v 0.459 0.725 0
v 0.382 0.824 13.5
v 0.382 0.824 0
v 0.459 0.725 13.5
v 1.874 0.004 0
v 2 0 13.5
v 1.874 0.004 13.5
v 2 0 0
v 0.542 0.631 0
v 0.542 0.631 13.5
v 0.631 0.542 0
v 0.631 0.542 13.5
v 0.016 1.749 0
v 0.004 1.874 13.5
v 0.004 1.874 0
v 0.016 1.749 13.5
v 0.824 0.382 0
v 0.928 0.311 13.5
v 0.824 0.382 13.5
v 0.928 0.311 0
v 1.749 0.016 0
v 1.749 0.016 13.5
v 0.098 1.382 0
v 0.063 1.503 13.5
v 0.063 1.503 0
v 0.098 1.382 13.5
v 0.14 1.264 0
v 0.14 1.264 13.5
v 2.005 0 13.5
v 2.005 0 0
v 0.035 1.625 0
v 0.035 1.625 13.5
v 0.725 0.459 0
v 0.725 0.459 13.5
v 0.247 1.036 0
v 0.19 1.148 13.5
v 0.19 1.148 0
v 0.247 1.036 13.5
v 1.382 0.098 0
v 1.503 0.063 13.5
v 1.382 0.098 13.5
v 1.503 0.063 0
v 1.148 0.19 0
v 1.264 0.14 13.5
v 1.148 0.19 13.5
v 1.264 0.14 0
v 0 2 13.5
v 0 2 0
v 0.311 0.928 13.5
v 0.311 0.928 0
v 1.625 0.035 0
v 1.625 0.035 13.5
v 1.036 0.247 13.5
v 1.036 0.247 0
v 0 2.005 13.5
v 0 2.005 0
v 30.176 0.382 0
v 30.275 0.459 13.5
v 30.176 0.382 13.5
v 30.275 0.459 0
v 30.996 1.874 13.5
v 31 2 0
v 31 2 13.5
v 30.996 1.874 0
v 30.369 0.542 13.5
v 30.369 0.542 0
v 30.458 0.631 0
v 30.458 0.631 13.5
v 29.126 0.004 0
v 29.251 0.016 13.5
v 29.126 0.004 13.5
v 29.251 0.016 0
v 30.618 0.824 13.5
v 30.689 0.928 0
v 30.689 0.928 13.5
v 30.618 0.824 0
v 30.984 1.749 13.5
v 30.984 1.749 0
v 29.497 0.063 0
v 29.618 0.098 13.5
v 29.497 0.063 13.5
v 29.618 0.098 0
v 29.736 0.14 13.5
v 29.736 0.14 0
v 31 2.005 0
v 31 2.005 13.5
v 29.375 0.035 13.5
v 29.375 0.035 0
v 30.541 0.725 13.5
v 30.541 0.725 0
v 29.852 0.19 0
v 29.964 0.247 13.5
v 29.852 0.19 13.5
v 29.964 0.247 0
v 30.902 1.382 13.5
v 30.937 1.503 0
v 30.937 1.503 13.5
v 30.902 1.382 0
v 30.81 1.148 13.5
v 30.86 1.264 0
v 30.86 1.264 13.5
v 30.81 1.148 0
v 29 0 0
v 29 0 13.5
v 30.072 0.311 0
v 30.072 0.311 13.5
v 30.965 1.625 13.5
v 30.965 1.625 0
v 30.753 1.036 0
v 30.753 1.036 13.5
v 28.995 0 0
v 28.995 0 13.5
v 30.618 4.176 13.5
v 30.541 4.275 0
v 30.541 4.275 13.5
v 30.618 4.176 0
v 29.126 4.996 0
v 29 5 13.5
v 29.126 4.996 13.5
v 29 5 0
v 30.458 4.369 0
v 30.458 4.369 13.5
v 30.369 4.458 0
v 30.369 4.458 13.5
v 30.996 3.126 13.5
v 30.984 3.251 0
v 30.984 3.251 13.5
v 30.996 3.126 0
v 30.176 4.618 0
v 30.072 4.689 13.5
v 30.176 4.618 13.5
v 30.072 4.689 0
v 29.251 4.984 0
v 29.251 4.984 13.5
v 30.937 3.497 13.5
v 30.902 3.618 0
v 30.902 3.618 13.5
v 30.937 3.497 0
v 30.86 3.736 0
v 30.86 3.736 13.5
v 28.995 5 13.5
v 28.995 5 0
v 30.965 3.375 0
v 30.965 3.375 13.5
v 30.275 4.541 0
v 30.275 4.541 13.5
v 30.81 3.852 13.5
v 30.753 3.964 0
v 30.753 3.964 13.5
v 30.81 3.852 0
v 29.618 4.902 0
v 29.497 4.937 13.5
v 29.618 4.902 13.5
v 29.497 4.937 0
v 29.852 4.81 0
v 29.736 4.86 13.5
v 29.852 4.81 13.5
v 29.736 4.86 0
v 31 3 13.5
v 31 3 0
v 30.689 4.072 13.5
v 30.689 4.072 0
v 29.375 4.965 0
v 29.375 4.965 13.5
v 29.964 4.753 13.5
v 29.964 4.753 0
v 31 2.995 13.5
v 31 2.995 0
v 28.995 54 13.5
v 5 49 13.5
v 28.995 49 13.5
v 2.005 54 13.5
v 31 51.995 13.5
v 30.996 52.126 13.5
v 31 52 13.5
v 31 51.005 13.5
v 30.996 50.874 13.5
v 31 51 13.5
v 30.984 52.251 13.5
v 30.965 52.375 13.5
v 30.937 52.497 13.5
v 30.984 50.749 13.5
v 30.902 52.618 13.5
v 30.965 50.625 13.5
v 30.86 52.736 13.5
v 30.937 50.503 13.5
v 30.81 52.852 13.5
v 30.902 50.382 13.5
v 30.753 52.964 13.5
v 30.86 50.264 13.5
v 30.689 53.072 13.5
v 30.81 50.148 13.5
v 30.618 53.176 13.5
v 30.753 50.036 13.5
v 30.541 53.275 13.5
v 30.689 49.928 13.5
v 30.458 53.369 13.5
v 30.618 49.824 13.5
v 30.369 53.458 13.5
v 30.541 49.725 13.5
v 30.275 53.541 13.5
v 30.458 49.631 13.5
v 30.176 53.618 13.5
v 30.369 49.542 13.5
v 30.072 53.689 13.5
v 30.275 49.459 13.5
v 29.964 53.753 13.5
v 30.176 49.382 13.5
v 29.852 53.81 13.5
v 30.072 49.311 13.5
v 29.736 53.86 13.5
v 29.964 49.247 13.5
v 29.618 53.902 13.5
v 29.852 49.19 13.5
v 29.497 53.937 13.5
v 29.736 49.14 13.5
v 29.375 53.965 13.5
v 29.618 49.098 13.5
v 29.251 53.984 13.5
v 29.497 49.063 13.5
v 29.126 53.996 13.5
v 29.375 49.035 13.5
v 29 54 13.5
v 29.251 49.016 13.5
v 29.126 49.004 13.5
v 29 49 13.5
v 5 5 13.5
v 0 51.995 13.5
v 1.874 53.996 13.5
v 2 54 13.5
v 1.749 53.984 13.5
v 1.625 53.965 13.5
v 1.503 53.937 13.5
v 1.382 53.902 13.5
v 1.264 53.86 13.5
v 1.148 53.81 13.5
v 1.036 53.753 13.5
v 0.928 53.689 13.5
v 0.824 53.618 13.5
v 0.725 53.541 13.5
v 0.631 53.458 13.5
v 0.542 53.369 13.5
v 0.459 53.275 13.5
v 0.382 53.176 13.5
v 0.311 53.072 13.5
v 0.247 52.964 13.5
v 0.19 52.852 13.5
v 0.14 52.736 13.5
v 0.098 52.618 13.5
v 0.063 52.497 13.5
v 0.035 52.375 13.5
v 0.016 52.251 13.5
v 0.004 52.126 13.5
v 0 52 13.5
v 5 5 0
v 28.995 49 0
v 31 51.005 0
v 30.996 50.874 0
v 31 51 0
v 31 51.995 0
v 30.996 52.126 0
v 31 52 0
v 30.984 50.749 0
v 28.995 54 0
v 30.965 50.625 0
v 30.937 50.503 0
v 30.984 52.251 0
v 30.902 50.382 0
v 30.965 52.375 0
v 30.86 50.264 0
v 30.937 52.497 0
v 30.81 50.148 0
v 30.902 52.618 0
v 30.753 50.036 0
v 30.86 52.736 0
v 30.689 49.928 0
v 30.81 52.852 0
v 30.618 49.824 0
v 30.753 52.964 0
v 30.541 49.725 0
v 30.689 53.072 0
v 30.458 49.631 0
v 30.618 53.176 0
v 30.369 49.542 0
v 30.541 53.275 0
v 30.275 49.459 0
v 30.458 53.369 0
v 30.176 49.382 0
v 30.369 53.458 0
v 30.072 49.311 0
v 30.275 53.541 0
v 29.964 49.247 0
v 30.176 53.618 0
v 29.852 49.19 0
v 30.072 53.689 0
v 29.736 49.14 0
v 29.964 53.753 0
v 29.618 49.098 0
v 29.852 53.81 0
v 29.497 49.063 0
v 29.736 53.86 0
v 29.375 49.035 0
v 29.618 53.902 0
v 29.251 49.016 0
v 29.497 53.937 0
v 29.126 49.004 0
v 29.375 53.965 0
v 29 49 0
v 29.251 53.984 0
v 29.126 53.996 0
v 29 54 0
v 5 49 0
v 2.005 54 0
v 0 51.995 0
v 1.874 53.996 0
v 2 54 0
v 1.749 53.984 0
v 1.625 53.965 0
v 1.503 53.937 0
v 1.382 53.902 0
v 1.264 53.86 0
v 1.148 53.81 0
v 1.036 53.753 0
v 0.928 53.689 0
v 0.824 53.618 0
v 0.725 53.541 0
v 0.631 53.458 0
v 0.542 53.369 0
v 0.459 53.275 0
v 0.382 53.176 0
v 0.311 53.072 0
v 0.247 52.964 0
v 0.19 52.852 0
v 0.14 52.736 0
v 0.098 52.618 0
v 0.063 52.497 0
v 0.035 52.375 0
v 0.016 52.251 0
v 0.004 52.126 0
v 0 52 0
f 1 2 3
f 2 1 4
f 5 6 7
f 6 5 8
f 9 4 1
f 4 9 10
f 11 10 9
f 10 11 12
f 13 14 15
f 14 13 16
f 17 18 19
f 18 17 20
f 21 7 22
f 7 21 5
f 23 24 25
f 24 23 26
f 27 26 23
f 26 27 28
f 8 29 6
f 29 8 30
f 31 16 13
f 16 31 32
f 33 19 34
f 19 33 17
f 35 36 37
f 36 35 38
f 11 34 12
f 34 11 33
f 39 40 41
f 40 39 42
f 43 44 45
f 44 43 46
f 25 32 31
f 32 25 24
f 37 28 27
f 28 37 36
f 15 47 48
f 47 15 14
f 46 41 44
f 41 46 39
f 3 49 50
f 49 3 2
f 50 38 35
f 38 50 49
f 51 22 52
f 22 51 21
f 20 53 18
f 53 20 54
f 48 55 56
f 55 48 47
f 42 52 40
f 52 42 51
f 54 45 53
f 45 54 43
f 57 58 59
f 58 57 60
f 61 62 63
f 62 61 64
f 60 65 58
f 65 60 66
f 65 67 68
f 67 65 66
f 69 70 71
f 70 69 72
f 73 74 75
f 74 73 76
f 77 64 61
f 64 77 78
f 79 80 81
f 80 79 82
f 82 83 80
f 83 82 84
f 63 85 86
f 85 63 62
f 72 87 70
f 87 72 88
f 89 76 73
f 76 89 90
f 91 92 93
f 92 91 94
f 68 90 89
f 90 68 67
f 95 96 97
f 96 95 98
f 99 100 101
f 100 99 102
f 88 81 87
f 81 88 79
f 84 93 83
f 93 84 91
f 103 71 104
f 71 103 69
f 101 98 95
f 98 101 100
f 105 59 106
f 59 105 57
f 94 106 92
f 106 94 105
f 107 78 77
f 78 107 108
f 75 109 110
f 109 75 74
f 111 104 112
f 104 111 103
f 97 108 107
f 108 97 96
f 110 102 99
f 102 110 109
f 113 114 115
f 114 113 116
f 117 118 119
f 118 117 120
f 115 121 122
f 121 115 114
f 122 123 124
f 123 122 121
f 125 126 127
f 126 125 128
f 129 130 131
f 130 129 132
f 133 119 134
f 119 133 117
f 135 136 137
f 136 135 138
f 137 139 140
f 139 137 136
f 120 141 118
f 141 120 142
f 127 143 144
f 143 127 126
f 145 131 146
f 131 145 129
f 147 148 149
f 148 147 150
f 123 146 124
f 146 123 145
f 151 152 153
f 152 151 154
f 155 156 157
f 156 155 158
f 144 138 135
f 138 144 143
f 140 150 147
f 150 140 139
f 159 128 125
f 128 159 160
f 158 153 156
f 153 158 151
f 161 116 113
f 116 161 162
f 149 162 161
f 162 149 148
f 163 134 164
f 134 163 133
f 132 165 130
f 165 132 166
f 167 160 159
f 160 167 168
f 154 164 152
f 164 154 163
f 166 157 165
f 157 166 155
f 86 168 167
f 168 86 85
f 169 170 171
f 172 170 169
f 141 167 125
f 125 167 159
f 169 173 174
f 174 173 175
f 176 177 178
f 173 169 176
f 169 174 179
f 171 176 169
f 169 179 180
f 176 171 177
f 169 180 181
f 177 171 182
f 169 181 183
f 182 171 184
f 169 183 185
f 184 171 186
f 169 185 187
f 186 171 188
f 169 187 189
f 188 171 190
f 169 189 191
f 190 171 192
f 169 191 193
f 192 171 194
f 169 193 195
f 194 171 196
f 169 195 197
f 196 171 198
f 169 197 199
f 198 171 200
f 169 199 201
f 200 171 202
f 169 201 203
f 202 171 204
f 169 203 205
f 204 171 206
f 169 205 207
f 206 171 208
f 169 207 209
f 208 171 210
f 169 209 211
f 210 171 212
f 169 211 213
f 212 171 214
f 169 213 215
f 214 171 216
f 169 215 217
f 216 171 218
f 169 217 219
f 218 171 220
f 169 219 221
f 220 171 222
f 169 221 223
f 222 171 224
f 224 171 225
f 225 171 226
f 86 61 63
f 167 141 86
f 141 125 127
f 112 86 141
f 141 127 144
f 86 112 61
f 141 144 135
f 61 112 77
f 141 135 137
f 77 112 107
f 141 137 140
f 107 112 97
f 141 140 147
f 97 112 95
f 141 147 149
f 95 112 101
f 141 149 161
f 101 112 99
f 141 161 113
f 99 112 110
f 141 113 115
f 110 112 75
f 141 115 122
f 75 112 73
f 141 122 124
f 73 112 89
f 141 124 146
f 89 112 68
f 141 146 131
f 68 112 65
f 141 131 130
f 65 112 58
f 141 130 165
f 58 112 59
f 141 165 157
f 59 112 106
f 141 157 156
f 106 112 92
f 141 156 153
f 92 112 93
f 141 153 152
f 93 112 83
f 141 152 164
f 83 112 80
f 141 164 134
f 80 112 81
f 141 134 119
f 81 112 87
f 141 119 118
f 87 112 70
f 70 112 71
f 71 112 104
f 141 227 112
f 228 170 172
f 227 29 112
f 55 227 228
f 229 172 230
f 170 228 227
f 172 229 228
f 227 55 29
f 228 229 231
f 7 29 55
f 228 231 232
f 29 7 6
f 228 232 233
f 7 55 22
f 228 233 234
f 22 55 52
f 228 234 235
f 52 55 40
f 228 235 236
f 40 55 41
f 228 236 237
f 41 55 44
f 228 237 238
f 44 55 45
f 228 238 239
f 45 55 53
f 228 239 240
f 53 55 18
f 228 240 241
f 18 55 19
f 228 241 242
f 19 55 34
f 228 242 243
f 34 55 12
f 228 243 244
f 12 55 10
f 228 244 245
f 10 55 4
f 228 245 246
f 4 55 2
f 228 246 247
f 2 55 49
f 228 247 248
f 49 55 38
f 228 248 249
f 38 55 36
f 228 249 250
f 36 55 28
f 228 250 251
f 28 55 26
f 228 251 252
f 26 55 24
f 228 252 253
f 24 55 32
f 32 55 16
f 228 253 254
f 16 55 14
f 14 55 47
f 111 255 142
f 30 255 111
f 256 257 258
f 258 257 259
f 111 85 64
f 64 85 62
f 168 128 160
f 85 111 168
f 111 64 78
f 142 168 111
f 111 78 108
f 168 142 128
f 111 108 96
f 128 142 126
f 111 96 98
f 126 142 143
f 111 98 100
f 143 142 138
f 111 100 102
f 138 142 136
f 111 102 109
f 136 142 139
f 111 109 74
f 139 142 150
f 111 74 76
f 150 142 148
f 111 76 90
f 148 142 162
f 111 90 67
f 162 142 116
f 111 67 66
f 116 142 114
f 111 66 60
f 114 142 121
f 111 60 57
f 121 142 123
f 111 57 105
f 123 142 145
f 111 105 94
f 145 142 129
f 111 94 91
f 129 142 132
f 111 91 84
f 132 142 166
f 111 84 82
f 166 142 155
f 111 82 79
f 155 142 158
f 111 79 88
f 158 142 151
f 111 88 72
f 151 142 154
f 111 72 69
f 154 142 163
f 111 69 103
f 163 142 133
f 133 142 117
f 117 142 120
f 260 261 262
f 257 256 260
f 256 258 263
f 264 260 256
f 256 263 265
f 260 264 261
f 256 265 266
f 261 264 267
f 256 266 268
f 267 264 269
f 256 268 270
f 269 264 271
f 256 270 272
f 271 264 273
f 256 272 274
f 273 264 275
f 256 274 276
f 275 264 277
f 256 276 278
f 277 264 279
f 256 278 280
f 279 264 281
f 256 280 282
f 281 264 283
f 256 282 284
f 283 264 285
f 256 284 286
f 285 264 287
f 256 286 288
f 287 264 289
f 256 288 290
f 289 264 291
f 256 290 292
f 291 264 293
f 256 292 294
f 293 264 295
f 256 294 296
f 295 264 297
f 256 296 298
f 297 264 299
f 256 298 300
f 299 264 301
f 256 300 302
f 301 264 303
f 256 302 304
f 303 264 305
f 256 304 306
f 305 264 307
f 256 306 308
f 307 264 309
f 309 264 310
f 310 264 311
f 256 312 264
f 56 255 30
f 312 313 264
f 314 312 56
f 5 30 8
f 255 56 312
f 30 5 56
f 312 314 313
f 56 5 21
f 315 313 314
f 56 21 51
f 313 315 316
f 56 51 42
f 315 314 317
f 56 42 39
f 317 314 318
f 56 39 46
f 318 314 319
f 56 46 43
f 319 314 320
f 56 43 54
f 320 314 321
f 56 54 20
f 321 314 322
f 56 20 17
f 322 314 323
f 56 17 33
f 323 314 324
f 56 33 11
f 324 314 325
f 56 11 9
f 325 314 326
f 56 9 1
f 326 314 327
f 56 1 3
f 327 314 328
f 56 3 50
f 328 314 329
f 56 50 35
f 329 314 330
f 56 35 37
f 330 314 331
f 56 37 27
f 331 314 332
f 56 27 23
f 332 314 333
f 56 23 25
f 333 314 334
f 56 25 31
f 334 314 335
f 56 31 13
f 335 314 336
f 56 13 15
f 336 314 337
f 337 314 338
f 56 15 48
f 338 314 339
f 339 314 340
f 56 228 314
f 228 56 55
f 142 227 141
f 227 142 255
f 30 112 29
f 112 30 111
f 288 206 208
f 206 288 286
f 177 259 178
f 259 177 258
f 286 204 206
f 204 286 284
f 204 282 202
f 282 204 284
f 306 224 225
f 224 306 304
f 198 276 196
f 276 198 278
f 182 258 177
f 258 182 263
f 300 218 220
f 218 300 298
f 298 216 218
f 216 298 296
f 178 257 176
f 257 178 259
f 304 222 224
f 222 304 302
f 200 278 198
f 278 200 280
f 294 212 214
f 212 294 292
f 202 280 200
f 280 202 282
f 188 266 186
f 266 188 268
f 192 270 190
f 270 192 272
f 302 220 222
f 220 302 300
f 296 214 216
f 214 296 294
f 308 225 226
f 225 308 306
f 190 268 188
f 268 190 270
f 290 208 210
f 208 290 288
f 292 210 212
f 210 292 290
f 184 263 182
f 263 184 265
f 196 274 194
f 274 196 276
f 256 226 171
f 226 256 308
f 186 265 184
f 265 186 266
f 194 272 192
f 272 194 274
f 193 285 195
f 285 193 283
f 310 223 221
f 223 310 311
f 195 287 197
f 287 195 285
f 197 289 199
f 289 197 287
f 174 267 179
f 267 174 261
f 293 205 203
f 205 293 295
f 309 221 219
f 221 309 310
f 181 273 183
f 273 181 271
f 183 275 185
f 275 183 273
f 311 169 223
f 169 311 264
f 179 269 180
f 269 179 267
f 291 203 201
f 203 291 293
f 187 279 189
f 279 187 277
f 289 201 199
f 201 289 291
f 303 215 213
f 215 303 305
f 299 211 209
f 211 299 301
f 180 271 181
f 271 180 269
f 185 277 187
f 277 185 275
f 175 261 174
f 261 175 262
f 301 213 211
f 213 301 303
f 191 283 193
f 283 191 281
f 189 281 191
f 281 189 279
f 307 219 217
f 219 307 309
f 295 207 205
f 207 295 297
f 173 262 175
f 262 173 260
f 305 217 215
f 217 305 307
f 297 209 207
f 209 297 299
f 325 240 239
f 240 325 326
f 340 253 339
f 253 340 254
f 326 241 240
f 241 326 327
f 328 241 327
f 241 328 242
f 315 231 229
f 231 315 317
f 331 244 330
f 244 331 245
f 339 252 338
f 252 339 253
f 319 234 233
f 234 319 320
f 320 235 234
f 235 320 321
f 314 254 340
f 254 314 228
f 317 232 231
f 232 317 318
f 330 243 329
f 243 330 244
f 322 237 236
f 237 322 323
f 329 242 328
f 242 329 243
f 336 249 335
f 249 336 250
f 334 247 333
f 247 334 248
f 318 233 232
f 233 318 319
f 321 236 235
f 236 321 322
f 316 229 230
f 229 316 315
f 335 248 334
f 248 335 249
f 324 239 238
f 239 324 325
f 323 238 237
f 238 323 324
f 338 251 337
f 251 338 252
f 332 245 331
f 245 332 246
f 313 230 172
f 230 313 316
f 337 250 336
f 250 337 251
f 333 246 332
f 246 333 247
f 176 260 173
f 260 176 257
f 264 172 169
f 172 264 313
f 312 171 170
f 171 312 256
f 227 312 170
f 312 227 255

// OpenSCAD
/*
This is a xy move servo mounting for two servos (default SG90)

You can edit the servo dimensions below to fit your requirements
Also select the suitable screwHole to fit with your mounting screw. Use about -0.75mm less than the outer diameter of the actual screw to fit straight.


servoRotationDiffLarge+servoRotationDiffSmall != servoLength
*/

/*
   <-Length-->
   .=========.     ----
|O-|      X  |-O|  Width
   '========='     ----
 <----DHole---->
<- total Lenght->

   diff large
          diff small
   <-----><->
      ----o----              -----
   .______X__.                 |
|O-|         |-O|  ------      | 
   |         |     Height    Mounting Height
   |         |       |         |
   '========='     ------    ----
   <-Length-->
<- total Lenght->
*/

servoLength = 28.0; // mm
servoTotalLength = 42.0;    // mm
servoWidth = 13.5;  // mm
servoHeight = 20.0; // mm
servoMountingHeight = 37.0; // mm
servoRotationDiffSmall = 7.0;    // mm
servoRotationDiffLarge = 21.0;  // mm
distanceHole = 35.0;    // distance between center of mounting holes
screwHole = 1.5;    // mm
screwLength = 15.0; // mm
screwArm = 3.0;     // mm

servoArm();

module servoArm($fn=100)
{
    // mounting at the servo arm
    difference()
    {
        cube([10+(servoTotalLength-servoLength)+servoRotationDiffSmall, 5, servoWidth], center=false);
        fillet(2, servoWidth*2+1);
        translate([10+(servoTotalLength-servoLength)+servoRotationDiffSmall, 0, 0]) rotate([0, 0, 90])fillet(2, servoWidth*2+1);
        translate([10+(servoTotalLength-servoLength)+servoRotationDiffSmall, 5, 0]) rotate([0, 0, 180])fillet(2, servoWidth*2+1);
    }
    
    // sensor mounting 
    translate([0, 5, 0])
    {
        difference()
        {
            cube([5, (servoTotalLength-servoLength)/2+servoMountingHeight, servoWidth], center=false);
            //translate([0, servoMountingHeight+12, 0]) rotate([0, 0, -90])fillet(2, servoWidth*2+1);
        }
    }
            
    difference()
    {
        // mounting at the back of the servo
        translate([0, 5+(servoTotalLength-servoLength)/2+servoMountingHeight, 0]) cube([10+(servoTotalLength-servoLength)+servoRotationDiffSmall, 5, servoWidth], center=false);
        translate([10+(servoTotalLength-servoLength)+servoRotationDiffSmall, servoMountingHeight+12, 0]) rotate([0, 0, 90])fillet(2, servoWidth*2+1);
        translate([10+(servoTotalLength-servoLength)+servoRotationDiffSmall, servoMountingHeight+12+5, 0]) rotate([0, 0, 180])fillet(2, servoWidth*2+1);
        translate([0, servoMountingHeight+12+5, 0]) rotate([0, 0, -90])fillet(2, servoWidth*2+1);
    }
}

// get round corners
module fillet(r, h, $fn=100)
{
    translate([r / 2, r / 2, 0])
    {
        difference()
        {
            cube([r + 0.01, r + 0.01, h], center = true);

            translate([r/2, r/2, 0])
                cylinder(r = r, h = h + 1, center = true);
        }
    }
}
